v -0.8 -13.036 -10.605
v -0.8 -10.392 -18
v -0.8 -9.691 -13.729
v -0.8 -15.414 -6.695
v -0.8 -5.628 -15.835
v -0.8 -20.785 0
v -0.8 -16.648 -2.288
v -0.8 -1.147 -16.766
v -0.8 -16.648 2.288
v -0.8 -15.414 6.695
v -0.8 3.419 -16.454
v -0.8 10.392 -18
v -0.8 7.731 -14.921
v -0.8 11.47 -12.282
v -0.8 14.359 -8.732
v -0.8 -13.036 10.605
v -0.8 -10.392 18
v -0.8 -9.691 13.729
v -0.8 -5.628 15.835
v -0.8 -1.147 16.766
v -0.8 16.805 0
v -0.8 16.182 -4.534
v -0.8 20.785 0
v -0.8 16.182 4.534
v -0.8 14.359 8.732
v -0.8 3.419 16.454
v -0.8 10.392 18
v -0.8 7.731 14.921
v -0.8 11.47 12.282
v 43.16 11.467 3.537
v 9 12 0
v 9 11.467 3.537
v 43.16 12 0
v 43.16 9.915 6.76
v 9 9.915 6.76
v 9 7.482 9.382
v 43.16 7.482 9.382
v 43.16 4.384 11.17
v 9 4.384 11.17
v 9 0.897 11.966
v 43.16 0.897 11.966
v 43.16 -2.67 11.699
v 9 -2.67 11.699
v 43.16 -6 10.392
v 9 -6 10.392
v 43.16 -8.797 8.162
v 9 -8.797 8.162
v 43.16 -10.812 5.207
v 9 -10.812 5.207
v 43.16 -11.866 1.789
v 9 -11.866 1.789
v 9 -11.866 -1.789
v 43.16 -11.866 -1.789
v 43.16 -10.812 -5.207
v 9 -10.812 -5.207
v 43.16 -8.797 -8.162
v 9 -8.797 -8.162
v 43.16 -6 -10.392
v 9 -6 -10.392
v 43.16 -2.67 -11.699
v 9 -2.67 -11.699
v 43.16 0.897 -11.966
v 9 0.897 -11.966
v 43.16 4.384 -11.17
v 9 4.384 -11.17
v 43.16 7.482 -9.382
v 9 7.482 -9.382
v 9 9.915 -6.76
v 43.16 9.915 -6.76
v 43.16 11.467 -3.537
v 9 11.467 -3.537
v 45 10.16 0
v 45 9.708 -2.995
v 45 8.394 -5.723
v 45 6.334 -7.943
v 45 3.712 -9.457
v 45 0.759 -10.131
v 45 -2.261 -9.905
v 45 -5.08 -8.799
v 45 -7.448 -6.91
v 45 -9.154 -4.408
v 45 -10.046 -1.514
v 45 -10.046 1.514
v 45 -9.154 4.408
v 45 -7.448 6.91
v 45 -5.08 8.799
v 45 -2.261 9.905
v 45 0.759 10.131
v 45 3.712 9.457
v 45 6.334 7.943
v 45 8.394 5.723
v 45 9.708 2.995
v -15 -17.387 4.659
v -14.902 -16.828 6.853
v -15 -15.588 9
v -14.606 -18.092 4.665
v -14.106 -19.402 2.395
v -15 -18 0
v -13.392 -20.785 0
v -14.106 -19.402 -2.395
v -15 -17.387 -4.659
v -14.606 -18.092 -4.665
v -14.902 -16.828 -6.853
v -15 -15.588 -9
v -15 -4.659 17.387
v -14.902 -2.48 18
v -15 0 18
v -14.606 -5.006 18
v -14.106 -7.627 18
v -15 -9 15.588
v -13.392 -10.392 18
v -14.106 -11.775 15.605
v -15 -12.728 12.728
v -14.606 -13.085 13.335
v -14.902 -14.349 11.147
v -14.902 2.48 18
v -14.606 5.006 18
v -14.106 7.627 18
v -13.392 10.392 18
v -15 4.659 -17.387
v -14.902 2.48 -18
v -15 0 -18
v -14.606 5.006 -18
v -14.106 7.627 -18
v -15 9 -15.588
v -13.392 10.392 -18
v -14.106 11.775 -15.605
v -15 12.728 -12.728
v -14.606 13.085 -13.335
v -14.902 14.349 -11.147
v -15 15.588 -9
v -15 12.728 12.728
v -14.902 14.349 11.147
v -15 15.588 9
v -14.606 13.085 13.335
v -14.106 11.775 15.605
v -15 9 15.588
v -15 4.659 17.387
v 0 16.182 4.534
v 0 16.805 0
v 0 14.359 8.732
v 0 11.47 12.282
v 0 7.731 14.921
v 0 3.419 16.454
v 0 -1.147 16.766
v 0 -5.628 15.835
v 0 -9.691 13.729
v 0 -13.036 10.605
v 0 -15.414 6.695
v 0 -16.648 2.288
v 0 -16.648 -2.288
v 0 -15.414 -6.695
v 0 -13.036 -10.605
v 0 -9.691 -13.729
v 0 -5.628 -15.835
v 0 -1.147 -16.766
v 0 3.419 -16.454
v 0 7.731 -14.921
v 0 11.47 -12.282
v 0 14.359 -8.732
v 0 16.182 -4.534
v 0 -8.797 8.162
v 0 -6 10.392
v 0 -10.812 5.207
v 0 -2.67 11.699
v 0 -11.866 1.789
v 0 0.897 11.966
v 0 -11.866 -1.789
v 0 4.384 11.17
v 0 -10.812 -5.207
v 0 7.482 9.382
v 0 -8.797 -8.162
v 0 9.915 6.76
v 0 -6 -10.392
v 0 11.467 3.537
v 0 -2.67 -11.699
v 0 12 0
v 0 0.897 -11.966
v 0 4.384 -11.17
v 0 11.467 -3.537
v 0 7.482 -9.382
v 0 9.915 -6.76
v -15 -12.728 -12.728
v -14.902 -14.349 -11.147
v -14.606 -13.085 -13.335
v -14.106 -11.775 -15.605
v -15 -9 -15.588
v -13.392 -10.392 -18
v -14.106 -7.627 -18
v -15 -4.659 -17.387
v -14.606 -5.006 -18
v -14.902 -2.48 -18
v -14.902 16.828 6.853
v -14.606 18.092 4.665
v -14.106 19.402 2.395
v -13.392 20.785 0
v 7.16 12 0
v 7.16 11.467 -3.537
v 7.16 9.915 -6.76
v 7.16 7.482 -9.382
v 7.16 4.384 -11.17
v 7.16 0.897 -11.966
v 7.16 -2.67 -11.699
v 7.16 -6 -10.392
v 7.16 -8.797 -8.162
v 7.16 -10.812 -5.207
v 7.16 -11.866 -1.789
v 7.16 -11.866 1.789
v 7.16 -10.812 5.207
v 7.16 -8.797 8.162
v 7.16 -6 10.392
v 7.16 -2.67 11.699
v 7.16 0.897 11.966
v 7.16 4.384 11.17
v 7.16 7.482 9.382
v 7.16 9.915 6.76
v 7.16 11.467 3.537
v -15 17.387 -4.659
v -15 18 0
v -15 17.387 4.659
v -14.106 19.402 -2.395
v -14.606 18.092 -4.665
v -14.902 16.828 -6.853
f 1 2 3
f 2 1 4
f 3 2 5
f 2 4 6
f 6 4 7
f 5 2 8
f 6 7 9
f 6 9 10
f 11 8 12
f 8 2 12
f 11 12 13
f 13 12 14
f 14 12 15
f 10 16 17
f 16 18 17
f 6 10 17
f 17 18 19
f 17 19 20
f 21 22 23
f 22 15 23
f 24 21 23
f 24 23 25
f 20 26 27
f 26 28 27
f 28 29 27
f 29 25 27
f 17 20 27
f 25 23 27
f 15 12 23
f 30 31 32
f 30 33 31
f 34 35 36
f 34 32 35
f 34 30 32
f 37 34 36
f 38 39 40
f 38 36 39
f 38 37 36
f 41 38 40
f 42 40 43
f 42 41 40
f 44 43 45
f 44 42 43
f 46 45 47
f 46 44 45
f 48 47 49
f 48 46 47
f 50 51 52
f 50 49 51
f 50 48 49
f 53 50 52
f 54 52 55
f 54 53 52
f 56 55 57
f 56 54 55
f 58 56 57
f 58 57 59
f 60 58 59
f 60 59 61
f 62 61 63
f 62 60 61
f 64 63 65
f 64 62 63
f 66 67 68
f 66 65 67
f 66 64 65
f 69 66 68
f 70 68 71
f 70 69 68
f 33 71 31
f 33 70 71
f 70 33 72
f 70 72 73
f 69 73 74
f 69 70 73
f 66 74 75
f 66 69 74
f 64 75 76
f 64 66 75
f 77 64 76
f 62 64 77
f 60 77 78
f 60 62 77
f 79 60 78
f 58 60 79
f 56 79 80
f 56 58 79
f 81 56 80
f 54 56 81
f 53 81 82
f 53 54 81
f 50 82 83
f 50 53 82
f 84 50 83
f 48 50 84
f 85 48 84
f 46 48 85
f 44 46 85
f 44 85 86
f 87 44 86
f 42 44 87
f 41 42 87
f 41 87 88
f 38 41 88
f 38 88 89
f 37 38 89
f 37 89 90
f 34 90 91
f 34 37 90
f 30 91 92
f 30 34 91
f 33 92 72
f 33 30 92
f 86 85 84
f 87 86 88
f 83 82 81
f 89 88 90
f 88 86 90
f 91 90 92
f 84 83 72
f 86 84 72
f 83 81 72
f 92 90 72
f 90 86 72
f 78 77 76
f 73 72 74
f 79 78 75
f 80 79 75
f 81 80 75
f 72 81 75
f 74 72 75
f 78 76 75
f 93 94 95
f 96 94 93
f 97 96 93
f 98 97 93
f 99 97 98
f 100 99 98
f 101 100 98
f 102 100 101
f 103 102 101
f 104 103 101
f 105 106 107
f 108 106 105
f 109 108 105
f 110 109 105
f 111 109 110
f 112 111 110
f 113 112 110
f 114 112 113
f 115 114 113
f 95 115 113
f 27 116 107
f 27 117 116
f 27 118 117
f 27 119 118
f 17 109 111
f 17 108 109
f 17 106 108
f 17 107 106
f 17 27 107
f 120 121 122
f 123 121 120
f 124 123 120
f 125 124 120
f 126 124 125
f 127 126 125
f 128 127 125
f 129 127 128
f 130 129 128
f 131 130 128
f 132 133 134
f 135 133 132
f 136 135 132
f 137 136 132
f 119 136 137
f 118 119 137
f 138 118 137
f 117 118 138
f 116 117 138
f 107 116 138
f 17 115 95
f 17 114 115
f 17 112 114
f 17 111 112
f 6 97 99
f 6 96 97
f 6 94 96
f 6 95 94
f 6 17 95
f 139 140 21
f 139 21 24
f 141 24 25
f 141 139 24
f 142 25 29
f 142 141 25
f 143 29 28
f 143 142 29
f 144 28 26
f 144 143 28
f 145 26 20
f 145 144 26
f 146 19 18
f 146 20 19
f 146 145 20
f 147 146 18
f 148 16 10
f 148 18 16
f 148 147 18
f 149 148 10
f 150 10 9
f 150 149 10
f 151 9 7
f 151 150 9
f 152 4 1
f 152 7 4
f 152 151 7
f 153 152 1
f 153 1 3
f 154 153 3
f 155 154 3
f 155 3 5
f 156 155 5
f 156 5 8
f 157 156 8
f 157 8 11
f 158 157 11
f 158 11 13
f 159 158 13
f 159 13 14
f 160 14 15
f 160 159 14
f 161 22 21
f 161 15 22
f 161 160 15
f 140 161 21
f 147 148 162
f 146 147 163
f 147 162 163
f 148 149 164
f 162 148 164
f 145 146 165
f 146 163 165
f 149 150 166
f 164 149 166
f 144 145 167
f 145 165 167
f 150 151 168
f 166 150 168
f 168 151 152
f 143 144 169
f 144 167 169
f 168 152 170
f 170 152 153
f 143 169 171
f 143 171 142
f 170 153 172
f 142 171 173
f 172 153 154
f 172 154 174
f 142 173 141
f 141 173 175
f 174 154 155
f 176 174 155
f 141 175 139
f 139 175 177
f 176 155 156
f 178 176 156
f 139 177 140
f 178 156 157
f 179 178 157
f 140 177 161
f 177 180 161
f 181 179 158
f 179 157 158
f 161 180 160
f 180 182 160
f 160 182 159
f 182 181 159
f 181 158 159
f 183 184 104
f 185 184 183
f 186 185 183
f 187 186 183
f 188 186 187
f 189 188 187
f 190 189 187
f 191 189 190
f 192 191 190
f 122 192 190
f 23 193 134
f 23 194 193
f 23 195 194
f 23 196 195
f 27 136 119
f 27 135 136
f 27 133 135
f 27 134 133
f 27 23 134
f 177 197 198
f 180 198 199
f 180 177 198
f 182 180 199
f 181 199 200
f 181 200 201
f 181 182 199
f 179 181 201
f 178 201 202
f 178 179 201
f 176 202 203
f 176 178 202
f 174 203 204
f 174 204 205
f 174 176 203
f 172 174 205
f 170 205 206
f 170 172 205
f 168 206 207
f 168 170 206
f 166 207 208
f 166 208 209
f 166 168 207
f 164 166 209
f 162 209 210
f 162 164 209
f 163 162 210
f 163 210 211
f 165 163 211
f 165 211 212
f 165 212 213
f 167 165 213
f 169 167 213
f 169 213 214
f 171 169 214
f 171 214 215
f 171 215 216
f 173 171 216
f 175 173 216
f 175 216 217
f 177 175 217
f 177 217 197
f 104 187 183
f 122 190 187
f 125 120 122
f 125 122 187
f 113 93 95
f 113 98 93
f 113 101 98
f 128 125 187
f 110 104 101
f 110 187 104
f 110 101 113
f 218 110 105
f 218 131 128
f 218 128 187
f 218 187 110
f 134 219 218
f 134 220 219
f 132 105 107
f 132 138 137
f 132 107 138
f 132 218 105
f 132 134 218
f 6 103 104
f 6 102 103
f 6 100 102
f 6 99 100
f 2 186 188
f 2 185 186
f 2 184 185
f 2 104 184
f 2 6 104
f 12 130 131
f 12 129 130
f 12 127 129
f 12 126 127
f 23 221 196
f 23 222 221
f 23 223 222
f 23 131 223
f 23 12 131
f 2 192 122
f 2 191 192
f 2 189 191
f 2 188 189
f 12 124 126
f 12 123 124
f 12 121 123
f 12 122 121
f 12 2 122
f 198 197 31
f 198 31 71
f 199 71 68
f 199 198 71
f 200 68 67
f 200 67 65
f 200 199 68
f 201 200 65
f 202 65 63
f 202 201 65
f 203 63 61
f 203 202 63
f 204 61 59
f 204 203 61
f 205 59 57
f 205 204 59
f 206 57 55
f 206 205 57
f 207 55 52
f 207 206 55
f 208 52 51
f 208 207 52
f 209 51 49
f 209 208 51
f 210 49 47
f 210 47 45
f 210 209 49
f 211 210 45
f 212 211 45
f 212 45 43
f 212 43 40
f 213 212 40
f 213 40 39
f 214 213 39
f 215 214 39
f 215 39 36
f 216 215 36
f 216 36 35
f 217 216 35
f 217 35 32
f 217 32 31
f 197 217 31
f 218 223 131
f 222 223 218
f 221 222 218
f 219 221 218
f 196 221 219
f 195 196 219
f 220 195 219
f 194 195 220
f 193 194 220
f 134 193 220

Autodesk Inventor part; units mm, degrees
ref_plane "YZ Plane" through (0, 0, 0) normal (1, 0, 0) x (0, 1, 0)
ref_plane "XZ Plane" through (0, 0, 0) normal (0, 1, 0) x (-1, 0, 0)
sketch "Sketch1" plane through (0, 0, 0) normal (0, 0, 1) x (1, 0, 0)
  line L0 (0, 16.805) -> (0, 12)
  line L1 (9, 12) -> (45, 12)
  line L2 (45, 12) -> (45, 0)
  line L3 (45, 0) -> (-0.8001, 0)
  line L4 (-9.9601, 0) -> (54.16, 0) projected
  line L5 (-0.8001, 0) -> (-0.8001, 16.805)
  line L6 (-0.8001, 16.805) -> (0, 16.805)
  line L7 (9, 12) -> (7.1596, 12)
  line L8 (7.1596, 12) -> (0, 12)
  line L9 (0, -3.361) -> (0, 20.166) projected
  dimension "d0" = 45
  dimension "d1" = 36
  dimension "d2" = 24
  dimension "d9" = 0.8001
  dimension "d10" = 33.61
  dimension "d13" = 1.8404
  dimension "d14" = 24
revolve "Body" add sketch "Sketch1" angle 360 about axis through (45, 0, 0) along (-1, 0, 0)
sketch "Sketch2" plane through (-0.8001, 0, 0) normal (-1, 0, 0) x (0, 0, 1)
  line L0 (0, 20.7846) -> (18, 10.3923)
  line L1 (18, 10.3923) -> (18, -10.3923)
  line L2 (18, -10.3923) -> (0, -20.7846)
  line L3 (0, -20.7846) -> (-18, -10.3923)
  line L4 (-18, -10.3923) -> (-18, 10.3923)
  line L5 (-18, 10.3923) -> (0, 20.7846)
  point P0 (0, 0)
  point P1 (0, 0)
  dimension "d11" = 36
extrude "Head" add sketch "Sketch2" along normal blind 14.2
sketch "Sketch4" plane through (0, 0, 0) normal (0, 0, 1) x (1, 0, 0)
  line L0 (-15.0001, 18) -> (-15.0001, 20.7846)
  line L1 (-15.0001, 20.7846) -> (-13.3924, 20.7846)
  line L2 (-13.3924, 20.7846) -> (-15.0001, 18)
  line L3 (-17.8401, 0) -> (2.0399, 0) projected
  line L4 (-0.8001, 20.7846) -> (-15.0001, 20.7846) projected
  line L5 (-15.0001, 10.3923) -> (-15.0001, 20.7846) projected
  dimension "d5" = 30
  dimension "d19" = 36
revolve "Chamfer1" cut sketch "Sketch4" angle 360 about axis through (-10, 0, 0) along (1, 0, 0)
thread "Thread" size "M24x3" class "6g" standard "ISO Metric profile" length 36
chamfer "Chamfer2" distance 1.8403 distance2 1.8405 1 edges at (45, -12, 0) measured on face at (45, -4.6056, 1.5967)
ref_plane "Work Plane1" through (1.525, 0, 0) normal (0, 0, 1) x (1, 0, 0)
equation "\"d0\" = NLG"
equation "\"d1\" = GEL"
equation "\"d2\" = GD"
equation "\"d10\" = SD2"
equation "\"d14\" = BDM"
equation "\"d11\" = SW"
equation "\"d3\" = KOH - SD"
equation "\"d5\" = ANG1"
equation "\"d19\" = SW0"
equation "\"d15\" = GEL"
equation "\"d6\" = -0.5 * SPD + 0.5 * GD"
equation "\"NLG\" = 45"
equation "\"GD\" = NND"
equation "\"BDM\" = NND"
equation "\"KOH\" = 15"
equation "\"GEL\" = 36"
equation "\"SW\" = 36"
equation "\"SW0\" = SW"
equation "\"SPD\" = NND - 1.2269 * PTC"
equation "\"SD2\" = SDH"
equation "\"SD\" = 0.8"
equation "\"ANG1\" = 30deg"
equation "\"GAL\" = 0.61345 * PTC"
equation "\"GUL\" = 0.61345 * PTC"
equation "\"RR\" = 0.8"
equation "\"GD1\" = THREADDIA - 1.2269 * PTC"
equation "\"THREADDIA\" = 24"
equation "\"SDH\" = 33.61"
equation "\"SDHG\" = 9"
equation "\"TOA\" = 30deg"
equation "\"PTC\" = 3"
equation "\"NND\" = 24"
equation "\"E0\" = 1.155 * SW"
properties part number "JIS B 1180 - A + B M24x45" material "Steel, Mild"
